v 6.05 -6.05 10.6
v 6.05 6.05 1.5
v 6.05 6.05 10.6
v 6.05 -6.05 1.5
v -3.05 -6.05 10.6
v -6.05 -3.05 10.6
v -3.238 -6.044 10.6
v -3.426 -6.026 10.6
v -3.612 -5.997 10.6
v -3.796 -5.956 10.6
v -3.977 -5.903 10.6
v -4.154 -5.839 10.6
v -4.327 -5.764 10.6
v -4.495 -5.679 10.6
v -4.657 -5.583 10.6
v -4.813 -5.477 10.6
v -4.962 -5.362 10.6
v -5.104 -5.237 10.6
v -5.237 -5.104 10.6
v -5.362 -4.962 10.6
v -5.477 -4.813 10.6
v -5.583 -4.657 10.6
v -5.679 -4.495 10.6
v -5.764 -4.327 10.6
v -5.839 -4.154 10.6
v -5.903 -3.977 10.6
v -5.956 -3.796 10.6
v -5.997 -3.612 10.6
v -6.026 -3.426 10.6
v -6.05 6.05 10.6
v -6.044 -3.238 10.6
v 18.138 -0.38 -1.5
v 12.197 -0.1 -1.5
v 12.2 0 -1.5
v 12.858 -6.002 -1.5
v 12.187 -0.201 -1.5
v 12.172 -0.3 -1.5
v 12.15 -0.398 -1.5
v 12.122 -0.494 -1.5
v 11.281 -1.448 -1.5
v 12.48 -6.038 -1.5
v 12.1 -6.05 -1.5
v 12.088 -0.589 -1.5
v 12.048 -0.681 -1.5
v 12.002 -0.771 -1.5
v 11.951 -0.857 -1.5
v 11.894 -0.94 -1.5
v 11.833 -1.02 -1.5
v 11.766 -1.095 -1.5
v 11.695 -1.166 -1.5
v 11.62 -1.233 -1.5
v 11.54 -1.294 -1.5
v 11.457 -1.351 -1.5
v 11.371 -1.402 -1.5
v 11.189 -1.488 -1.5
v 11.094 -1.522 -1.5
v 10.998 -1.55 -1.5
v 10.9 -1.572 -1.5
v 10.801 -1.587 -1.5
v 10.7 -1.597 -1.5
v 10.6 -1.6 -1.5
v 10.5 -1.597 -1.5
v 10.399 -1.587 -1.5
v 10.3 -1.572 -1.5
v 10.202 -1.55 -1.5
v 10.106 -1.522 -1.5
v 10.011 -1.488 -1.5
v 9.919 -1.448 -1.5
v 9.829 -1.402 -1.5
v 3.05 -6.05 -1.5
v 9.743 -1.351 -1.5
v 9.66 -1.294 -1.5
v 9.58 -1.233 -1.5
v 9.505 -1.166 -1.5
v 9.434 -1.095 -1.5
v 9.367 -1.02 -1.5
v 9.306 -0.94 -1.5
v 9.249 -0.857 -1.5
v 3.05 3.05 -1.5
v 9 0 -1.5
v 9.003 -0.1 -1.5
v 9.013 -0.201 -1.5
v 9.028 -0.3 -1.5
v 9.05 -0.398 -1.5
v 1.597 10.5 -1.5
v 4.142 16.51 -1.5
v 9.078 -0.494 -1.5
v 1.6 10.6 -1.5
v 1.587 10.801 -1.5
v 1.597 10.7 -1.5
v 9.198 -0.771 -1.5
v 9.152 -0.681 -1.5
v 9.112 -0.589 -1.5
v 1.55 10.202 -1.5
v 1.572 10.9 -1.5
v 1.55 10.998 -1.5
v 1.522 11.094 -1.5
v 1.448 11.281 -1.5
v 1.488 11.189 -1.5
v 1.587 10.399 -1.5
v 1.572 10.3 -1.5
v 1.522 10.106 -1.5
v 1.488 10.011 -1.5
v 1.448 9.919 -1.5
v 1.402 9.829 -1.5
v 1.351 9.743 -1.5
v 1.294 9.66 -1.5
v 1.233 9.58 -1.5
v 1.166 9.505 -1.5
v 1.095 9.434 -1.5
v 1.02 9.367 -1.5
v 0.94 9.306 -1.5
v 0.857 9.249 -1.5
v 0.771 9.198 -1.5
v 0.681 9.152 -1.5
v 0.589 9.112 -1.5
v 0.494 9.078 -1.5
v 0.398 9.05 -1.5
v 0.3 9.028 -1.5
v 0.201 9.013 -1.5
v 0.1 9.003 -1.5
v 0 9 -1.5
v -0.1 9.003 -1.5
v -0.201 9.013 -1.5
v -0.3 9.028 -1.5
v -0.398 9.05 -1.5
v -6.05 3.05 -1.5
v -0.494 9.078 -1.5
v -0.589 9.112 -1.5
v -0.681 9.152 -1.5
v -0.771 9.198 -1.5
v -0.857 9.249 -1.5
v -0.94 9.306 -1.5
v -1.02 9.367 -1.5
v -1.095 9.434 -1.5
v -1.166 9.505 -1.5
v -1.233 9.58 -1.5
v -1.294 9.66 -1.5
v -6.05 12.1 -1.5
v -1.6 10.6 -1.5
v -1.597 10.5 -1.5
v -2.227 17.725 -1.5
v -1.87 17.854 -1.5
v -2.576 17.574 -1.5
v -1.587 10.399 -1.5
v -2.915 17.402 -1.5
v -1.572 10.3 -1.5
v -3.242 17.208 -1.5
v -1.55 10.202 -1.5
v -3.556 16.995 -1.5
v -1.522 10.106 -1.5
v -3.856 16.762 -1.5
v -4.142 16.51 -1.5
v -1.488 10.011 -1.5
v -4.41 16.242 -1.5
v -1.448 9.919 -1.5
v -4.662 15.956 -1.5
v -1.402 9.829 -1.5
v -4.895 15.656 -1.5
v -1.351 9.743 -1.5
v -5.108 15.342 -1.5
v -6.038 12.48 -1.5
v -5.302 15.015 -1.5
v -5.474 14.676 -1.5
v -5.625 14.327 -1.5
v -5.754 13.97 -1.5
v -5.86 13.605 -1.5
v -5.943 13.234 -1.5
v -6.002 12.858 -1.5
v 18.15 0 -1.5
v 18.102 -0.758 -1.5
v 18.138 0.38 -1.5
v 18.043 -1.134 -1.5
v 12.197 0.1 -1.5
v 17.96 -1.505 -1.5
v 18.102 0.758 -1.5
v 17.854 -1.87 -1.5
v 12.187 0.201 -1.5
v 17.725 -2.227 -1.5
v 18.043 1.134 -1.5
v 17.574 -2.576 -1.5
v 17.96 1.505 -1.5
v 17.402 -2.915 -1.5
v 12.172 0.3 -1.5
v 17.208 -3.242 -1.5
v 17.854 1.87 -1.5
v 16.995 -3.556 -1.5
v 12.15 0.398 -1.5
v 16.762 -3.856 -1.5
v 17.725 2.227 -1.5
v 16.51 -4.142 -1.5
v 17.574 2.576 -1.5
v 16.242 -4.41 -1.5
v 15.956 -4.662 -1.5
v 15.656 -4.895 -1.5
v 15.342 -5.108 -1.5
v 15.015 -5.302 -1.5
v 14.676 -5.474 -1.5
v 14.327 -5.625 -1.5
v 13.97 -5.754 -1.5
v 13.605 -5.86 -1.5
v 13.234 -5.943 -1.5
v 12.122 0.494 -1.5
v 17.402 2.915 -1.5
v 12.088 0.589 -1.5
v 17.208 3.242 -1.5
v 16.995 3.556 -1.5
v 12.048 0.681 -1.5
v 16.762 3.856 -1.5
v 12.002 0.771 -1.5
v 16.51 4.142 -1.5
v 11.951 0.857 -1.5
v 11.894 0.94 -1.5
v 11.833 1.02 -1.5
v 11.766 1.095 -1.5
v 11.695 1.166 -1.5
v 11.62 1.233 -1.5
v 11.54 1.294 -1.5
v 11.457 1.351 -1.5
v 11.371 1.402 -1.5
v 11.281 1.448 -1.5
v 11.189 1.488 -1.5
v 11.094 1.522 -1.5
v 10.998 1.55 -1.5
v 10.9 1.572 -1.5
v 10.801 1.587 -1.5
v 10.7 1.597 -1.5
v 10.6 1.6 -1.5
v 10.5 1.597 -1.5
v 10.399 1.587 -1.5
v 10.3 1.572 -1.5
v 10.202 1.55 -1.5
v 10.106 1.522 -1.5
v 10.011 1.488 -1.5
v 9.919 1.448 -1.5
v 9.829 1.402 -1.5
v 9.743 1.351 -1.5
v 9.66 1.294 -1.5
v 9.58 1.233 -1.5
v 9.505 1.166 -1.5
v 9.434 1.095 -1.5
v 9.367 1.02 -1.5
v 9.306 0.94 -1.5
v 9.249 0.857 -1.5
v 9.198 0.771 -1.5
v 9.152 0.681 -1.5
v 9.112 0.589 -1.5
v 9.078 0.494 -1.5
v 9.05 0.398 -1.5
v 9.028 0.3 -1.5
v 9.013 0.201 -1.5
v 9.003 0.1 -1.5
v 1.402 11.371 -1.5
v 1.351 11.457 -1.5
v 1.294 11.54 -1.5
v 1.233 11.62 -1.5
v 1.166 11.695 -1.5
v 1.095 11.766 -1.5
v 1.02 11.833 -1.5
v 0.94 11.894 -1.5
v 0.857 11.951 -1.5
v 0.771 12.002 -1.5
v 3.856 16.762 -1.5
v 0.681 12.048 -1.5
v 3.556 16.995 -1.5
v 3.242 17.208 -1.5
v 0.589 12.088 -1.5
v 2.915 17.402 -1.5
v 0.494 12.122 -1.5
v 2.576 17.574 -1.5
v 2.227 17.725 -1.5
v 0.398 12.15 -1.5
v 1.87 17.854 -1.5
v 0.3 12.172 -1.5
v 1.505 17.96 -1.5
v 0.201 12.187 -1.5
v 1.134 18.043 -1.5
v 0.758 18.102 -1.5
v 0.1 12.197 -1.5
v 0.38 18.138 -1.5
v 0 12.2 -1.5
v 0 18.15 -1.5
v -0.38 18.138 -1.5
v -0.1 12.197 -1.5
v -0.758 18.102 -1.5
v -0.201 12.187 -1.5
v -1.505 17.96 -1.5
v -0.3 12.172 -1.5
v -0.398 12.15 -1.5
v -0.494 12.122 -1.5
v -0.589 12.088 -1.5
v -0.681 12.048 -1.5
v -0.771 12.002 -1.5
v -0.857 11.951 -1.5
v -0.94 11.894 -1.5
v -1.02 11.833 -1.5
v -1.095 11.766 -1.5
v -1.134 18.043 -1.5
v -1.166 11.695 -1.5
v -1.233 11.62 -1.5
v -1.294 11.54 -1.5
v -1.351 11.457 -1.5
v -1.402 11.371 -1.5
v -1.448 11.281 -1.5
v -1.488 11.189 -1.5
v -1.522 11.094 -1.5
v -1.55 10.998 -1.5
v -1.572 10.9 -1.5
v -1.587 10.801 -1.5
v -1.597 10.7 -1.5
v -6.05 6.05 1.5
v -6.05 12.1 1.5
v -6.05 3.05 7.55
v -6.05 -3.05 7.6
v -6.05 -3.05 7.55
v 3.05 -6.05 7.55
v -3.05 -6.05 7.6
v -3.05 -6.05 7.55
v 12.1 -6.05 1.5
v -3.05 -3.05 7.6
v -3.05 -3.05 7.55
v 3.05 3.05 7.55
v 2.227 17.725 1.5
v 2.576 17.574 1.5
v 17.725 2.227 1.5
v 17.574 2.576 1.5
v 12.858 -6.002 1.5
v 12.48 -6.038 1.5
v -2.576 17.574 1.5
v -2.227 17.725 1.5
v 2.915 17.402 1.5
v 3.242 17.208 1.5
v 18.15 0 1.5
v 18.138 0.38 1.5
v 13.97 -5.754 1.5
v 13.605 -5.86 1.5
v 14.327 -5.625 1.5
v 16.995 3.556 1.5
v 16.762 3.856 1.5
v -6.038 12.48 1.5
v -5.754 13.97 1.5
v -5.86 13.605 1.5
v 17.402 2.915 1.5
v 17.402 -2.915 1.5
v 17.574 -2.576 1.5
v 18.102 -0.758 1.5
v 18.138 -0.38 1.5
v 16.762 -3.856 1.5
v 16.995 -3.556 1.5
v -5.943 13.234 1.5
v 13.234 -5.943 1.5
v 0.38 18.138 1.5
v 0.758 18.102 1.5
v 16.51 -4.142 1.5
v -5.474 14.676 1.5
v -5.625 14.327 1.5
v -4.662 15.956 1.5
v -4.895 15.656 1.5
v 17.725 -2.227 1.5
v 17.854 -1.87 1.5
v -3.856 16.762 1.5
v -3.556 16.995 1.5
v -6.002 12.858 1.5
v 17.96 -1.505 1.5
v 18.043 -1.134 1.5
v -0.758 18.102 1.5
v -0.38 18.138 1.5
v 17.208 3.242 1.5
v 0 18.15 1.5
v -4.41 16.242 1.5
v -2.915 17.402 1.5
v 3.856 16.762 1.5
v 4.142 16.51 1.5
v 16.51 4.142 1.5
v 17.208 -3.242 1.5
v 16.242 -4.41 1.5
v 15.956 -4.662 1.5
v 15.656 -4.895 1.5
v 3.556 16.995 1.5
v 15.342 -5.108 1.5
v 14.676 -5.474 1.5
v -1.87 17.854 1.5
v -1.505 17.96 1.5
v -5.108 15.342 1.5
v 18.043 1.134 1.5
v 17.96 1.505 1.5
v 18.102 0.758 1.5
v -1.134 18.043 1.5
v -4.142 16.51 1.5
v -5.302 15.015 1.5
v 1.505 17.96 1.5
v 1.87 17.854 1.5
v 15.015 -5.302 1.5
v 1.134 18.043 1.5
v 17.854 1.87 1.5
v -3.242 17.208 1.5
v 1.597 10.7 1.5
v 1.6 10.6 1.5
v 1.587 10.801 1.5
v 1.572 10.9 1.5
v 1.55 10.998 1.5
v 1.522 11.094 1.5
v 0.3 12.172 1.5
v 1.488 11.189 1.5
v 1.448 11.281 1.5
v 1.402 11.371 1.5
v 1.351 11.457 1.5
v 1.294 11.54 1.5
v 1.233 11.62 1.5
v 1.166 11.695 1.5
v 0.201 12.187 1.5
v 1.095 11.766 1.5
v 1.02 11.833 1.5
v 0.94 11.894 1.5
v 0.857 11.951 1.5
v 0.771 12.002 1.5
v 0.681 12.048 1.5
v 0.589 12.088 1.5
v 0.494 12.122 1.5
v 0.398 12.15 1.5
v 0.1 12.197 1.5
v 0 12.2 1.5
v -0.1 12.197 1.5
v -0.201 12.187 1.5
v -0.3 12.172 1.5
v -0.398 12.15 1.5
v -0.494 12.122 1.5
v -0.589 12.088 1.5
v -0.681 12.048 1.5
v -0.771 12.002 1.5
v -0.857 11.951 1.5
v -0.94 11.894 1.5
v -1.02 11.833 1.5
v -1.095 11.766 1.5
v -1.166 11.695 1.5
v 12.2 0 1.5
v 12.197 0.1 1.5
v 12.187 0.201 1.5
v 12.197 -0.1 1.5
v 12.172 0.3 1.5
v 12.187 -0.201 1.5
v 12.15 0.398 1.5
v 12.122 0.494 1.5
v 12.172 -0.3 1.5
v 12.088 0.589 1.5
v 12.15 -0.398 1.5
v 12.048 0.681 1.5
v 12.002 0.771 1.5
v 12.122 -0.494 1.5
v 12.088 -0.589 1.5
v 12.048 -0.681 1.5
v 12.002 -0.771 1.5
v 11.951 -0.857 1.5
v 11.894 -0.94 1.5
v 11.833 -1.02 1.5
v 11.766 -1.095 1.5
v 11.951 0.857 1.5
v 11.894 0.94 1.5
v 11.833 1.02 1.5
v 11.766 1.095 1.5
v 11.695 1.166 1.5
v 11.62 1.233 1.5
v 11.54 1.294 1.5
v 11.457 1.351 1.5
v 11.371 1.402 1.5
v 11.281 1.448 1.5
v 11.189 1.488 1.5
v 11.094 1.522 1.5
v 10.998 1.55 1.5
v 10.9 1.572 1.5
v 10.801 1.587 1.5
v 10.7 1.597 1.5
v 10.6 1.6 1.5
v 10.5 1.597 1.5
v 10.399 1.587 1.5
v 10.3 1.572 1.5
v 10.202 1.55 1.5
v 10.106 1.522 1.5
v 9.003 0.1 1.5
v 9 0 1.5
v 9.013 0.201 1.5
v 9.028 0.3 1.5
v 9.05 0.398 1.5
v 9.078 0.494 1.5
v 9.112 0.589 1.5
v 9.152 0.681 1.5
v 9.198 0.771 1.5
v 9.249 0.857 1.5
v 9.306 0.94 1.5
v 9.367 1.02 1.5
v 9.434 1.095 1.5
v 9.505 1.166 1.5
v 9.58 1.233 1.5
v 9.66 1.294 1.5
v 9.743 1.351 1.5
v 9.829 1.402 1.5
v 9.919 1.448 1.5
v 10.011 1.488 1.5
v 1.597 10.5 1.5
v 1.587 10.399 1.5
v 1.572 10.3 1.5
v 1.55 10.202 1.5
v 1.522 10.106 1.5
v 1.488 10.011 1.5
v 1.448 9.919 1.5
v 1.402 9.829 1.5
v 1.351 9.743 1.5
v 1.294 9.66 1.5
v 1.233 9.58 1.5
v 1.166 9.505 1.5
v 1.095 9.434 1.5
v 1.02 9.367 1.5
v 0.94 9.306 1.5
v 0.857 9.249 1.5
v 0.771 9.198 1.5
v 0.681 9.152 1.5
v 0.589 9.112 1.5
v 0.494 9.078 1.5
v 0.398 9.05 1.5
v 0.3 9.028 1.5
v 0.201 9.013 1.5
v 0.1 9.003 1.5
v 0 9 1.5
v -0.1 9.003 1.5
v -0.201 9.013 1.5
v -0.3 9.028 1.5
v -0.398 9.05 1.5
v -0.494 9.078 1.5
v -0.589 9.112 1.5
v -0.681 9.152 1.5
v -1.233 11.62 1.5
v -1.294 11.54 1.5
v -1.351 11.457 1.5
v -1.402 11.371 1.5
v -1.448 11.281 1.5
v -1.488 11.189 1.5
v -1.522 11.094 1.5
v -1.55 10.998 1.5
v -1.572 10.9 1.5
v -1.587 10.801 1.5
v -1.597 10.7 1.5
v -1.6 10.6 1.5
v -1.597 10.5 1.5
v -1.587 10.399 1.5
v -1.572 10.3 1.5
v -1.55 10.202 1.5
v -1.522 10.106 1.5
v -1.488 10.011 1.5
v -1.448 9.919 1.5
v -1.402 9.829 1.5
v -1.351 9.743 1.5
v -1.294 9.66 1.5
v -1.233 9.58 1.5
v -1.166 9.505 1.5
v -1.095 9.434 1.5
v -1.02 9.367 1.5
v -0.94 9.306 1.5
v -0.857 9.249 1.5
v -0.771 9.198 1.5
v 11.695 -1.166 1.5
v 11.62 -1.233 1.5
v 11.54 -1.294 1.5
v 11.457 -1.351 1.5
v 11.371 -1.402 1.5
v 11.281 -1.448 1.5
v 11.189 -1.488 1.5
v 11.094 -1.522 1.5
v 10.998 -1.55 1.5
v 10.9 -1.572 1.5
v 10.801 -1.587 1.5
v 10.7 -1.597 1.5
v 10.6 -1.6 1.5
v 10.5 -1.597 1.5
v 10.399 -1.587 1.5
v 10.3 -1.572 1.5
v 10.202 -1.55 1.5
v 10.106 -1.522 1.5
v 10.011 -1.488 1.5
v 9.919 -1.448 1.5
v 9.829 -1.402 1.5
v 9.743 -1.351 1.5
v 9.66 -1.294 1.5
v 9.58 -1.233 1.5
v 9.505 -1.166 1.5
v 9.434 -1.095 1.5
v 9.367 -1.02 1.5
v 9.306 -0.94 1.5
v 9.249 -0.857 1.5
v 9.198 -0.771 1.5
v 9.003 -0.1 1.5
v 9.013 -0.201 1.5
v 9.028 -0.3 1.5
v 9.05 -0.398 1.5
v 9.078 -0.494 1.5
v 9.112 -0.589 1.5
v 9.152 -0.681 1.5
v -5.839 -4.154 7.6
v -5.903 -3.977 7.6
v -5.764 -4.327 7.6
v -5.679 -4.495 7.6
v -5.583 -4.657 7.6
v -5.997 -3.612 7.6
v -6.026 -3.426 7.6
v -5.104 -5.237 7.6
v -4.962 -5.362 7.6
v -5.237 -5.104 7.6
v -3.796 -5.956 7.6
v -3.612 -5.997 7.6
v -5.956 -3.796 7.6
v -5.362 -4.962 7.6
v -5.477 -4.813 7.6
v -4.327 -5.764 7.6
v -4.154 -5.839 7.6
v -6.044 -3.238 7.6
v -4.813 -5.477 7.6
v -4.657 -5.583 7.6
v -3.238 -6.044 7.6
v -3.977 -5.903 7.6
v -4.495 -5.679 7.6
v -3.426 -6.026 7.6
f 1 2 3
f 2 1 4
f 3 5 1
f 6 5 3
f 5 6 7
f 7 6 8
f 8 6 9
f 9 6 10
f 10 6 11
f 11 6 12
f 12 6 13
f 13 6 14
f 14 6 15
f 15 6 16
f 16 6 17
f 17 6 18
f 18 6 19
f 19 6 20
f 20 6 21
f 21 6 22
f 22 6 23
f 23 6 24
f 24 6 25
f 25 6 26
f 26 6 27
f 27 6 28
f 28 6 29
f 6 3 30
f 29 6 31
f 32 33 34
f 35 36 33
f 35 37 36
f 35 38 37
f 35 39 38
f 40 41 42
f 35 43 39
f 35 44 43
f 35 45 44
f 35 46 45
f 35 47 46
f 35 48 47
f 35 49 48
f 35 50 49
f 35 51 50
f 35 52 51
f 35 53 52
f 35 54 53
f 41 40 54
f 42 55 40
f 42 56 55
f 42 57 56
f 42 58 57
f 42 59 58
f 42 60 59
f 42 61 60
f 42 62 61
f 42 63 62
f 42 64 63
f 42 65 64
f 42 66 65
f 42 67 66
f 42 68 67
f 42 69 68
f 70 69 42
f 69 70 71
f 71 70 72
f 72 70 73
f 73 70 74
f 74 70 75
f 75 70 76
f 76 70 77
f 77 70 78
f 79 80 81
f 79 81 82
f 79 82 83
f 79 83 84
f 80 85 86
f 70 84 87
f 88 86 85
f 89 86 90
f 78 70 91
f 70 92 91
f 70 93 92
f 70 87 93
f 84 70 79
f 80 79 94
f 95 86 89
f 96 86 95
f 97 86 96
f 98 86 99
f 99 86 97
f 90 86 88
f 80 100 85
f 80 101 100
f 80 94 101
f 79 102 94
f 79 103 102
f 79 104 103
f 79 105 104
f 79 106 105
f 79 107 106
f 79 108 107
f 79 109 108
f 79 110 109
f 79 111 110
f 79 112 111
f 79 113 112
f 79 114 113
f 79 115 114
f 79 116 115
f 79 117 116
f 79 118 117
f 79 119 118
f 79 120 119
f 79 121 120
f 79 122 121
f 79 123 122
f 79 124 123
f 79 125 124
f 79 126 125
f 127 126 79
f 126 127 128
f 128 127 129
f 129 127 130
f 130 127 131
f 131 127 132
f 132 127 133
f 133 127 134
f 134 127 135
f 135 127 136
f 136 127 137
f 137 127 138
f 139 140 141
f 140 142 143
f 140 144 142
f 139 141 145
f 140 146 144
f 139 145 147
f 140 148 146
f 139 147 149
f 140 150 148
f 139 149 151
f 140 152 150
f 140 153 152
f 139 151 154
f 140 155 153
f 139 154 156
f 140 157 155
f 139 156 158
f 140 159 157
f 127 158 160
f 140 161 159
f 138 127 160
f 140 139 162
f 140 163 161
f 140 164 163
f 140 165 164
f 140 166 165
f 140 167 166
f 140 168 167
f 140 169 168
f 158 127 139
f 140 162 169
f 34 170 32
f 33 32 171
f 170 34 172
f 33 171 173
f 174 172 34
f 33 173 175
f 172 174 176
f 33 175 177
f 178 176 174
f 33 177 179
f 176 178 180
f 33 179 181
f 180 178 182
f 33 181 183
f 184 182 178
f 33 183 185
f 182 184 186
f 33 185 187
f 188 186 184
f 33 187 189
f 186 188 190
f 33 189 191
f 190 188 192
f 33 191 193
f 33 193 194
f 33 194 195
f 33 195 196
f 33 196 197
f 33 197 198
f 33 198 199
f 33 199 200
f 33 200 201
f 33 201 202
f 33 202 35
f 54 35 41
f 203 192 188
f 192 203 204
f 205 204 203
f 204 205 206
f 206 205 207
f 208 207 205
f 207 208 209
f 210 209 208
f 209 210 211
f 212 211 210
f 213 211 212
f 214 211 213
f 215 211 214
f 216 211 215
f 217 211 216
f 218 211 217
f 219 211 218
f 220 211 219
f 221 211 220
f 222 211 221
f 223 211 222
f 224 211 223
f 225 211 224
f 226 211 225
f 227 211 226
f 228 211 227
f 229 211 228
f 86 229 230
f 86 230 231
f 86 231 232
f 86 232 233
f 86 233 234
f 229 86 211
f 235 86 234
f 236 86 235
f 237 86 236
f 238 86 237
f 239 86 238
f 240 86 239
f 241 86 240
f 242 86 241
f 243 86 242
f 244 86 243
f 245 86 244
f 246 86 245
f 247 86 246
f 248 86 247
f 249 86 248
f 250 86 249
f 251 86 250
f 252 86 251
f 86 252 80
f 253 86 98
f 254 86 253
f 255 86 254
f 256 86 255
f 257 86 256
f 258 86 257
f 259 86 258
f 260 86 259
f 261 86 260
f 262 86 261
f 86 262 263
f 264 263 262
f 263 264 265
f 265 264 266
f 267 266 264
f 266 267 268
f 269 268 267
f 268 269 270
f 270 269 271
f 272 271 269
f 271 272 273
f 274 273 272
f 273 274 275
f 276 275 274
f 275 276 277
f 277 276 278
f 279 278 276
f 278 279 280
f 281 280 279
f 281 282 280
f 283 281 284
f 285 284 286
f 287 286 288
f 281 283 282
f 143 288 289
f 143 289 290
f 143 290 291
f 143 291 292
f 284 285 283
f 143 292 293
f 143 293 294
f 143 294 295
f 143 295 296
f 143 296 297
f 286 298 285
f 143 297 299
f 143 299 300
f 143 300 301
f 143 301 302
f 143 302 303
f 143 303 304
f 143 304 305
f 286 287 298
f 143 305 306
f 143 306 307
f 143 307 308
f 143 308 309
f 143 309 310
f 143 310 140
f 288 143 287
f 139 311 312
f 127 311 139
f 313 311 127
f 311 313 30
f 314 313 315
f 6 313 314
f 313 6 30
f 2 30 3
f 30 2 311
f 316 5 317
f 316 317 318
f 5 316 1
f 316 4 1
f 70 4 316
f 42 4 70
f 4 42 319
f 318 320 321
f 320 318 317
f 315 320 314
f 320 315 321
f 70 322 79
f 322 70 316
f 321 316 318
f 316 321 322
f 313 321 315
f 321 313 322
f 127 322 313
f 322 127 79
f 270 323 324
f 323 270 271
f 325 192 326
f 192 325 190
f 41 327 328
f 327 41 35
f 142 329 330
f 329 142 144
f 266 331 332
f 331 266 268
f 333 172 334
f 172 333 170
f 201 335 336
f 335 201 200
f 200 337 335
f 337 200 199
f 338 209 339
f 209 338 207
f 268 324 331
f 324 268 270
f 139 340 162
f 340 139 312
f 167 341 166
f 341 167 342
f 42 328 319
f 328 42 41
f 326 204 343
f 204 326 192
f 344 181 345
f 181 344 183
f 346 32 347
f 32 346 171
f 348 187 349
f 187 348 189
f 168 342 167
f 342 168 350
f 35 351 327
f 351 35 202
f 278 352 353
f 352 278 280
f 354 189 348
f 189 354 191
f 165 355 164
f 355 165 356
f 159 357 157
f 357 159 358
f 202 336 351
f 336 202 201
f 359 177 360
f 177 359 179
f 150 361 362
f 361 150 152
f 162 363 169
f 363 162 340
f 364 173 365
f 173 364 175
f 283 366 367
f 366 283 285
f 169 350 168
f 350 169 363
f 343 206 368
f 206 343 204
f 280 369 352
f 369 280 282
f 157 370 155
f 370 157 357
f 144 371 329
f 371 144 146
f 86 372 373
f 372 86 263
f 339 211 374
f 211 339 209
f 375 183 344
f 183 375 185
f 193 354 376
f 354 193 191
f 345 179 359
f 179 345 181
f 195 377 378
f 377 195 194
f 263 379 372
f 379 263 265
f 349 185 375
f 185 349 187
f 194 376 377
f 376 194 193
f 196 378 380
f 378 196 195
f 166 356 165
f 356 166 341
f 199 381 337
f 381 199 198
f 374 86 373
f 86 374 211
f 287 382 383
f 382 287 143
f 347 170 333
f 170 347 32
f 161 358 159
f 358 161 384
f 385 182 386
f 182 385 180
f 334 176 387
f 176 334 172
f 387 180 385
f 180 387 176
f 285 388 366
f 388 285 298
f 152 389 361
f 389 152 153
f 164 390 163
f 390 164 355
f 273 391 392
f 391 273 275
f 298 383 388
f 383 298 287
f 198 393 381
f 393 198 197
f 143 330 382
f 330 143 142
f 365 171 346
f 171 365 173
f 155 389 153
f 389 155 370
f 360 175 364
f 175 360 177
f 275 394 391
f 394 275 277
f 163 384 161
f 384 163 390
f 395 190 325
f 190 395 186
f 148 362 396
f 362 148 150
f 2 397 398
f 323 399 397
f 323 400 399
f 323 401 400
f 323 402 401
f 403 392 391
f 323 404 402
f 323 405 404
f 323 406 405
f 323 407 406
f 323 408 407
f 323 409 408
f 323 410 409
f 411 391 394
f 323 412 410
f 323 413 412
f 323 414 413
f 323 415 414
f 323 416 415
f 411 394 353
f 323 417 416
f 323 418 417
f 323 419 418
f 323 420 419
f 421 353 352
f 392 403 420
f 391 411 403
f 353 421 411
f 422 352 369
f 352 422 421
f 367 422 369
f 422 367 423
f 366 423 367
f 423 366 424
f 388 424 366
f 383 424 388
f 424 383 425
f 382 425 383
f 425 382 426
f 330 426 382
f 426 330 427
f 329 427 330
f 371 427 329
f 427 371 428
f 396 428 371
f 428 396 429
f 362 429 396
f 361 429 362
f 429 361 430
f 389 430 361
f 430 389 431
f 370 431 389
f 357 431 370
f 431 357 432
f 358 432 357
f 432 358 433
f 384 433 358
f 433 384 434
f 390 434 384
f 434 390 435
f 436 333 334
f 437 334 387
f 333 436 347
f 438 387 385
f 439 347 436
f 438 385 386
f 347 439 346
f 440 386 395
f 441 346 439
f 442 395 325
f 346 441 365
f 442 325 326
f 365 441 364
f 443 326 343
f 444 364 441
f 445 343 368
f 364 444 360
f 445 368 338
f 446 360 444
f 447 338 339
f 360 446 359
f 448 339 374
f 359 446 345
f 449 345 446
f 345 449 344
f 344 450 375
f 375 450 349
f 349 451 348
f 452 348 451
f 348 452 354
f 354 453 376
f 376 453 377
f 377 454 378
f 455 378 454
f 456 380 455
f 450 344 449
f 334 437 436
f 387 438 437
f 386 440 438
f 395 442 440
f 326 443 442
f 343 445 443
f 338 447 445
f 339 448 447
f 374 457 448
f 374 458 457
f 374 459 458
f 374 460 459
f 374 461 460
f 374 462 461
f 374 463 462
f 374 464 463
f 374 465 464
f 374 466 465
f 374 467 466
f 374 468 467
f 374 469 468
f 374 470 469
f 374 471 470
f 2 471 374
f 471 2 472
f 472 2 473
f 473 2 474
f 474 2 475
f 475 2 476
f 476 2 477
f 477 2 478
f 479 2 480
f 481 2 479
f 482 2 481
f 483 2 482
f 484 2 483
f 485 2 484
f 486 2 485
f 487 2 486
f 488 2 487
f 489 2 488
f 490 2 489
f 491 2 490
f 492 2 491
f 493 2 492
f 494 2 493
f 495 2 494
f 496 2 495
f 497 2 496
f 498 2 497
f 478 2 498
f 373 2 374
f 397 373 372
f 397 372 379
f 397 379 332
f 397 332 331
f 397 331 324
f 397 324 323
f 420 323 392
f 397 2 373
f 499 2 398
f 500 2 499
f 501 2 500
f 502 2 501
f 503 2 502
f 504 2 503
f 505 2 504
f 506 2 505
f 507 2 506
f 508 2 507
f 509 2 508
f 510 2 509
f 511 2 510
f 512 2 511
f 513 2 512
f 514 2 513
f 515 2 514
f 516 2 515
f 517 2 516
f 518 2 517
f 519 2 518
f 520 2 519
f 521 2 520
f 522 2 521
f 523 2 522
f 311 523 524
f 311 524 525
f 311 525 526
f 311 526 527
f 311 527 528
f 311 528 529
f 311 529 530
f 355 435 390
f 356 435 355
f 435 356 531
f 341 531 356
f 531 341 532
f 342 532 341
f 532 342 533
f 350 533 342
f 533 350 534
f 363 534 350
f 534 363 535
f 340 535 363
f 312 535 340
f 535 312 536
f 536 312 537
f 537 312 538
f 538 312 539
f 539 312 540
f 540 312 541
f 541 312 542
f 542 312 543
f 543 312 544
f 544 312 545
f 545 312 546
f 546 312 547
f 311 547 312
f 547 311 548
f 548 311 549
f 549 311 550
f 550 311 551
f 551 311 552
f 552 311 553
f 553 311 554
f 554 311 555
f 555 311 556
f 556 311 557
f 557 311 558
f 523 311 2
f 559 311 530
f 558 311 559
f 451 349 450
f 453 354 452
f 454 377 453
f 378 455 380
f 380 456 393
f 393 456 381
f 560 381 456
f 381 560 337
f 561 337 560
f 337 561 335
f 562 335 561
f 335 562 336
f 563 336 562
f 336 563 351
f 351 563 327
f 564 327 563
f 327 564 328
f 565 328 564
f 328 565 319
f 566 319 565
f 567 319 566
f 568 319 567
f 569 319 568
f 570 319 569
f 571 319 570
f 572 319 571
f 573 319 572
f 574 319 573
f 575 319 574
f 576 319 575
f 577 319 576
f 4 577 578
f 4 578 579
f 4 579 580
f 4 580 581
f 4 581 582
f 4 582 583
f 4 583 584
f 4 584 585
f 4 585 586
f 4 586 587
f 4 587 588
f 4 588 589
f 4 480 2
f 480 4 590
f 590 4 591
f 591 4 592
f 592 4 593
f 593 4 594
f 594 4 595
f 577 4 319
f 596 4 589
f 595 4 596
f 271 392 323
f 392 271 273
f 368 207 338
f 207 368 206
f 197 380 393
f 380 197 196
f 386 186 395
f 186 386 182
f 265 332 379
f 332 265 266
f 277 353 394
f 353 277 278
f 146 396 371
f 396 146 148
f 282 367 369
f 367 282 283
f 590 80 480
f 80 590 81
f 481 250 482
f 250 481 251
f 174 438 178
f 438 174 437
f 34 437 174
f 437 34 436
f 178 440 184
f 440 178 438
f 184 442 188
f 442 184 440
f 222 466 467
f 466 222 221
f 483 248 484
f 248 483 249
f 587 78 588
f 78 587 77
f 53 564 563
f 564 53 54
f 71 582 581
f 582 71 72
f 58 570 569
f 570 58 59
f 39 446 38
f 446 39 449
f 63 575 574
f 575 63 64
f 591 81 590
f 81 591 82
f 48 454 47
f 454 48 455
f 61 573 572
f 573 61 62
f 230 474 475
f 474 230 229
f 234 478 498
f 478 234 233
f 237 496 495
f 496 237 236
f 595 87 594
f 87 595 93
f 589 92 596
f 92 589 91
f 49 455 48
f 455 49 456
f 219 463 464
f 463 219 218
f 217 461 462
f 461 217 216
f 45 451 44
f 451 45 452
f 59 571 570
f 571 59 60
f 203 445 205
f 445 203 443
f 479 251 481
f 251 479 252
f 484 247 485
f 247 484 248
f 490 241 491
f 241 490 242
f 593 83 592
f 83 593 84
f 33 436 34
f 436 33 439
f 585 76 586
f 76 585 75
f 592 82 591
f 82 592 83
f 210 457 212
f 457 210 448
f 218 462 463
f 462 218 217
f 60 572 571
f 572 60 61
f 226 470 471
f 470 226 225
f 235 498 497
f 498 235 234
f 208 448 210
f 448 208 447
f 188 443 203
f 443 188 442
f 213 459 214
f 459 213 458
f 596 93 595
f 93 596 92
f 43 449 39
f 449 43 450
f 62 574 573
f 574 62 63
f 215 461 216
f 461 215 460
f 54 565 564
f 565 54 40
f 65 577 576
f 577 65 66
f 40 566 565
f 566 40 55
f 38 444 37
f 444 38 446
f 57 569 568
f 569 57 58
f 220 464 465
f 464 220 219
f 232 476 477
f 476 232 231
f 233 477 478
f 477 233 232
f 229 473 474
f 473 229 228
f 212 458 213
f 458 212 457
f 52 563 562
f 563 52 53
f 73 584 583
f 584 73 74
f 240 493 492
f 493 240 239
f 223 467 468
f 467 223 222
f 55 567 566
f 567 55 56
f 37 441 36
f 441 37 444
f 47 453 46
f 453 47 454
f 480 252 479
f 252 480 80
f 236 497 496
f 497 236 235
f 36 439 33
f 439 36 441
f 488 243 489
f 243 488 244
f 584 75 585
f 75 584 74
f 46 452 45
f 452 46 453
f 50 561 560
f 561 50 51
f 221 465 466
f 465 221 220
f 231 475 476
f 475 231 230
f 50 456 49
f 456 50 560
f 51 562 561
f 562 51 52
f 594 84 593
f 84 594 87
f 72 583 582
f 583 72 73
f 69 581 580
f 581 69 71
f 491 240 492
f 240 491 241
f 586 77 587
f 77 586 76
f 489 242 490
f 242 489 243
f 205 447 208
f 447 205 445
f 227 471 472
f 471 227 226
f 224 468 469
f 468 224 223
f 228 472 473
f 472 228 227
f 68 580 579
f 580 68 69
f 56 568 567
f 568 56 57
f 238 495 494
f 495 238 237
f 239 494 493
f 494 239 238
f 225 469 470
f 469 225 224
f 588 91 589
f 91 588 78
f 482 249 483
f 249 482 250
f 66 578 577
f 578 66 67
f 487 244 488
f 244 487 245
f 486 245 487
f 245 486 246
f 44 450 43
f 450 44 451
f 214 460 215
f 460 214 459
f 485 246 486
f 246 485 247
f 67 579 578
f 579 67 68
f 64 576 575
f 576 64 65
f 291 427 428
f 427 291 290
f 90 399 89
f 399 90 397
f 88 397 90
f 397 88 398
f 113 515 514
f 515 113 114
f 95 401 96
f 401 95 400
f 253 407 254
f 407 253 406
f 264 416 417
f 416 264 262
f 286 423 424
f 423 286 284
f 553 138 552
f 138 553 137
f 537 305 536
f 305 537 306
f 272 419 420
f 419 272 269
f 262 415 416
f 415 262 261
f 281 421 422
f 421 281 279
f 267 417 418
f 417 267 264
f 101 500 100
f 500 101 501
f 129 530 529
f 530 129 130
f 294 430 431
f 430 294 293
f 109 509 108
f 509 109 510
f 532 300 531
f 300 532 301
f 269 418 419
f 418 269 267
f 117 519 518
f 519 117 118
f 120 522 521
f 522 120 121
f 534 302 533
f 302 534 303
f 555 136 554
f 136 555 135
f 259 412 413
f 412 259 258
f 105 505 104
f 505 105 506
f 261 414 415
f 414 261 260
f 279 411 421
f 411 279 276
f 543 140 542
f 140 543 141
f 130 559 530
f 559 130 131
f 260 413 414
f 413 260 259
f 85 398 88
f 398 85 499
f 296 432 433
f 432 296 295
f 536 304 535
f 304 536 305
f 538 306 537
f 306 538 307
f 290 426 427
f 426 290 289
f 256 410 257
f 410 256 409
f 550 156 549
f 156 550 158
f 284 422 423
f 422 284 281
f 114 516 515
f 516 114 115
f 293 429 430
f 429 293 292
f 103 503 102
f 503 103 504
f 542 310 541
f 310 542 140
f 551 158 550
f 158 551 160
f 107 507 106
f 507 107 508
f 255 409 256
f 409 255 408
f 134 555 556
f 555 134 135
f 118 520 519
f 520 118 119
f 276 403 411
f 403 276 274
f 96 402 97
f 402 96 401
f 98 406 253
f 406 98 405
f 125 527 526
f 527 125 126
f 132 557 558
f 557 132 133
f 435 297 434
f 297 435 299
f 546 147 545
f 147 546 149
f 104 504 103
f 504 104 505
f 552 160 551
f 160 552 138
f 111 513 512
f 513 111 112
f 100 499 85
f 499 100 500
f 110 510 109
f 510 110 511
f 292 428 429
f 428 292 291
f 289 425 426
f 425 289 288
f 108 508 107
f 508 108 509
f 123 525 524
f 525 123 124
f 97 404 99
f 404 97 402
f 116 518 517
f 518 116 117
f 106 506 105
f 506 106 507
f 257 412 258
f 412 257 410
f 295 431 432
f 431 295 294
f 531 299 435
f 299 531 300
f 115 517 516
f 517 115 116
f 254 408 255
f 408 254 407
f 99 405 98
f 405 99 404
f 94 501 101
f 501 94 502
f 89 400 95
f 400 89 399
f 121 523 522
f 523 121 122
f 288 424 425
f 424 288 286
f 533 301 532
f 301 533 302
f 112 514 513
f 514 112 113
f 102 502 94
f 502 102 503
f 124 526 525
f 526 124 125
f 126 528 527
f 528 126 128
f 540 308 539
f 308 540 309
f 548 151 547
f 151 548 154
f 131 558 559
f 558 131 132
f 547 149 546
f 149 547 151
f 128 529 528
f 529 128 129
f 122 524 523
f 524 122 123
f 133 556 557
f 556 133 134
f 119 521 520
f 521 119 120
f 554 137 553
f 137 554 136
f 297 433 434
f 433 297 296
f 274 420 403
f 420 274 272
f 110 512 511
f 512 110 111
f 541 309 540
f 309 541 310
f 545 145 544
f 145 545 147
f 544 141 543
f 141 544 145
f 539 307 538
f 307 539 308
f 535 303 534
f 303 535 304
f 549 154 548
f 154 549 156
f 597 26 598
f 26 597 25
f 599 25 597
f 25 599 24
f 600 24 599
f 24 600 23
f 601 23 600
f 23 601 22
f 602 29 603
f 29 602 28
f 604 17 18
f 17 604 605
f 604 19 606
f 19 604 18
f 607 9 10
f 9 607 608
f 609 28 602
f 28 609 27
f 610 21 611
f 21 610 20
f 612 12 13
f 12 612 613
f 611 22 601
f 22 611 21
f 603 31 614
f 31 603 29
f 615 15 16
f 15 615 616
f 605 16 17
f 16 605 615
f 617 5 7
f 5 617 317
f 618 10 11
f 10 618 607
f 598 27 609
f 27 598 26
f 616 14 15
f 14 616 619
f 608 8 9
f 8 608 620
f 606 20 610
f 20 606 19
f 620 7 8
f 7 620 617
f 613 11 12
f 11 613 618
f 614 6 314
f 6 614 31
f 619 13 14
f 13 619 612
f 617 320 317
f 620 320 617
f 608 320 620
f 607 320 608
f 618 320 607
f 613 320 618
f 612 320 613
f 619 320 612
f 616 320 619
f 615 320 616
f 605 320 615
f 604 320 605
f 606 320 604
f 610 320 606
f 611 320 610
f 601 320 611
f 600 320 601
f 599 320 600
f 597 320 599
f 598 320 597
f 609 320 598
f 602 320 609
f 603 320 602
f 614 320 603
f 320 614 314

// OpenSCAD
//Messurements

//Breadboard height
bbh = 9.1;

//Thickness of holder
wall = 3;

//Margin of error for screw
marg = 0.2;

//Faces of circles
faces = 100;


// Round corners and main cube
difference(){    
    
    //Make main cube
    difference(){ 
        translate([0, 0, (bbh+wall)/2-(wall/2)]){
            cube(bbh+wall, center=true);
        }
        // Corner cut out (For rounded corner)
        translate([-bbh/2, -bbh/2, bbh/2])
            cube([wall,wall,wall*10], center=true); 
    }
    
    //Cuts out where breadboard should be
    translate([-wall/2,-wall/2, wall]) cube(bbh, center=true);
}

// Circle for rounded corner
translate([-bbh/2+wall/2, -bbh/2+wall/2, bbh])
        cylinder(wall, r=wall, center=true, $fn=faces);

//Surround circles.
difference() {
    hull() {
        
        //Shape used for hulling
        cube([bbh+wall, bbh+wall, wall], center=true);
        
        //Circle 1
        translate([bbh+wall, 0, 0]) 
            cylinder(wall, d=bbh+wall, center=true,$fn=faces);
        
        //Circle 2
        translate([0, bbh+wall, 0]) 
            cylinder(wall, d=bbh+wall, center=true,$fn=faces);
    }

 

    //Cuts out where breadboard should be because otherwise big plate in bottom
    translate([-wall/2,-wall/2,-wall/2]) cube(bbh, center=true);
    
    //Make screw holes
    translate([bbh+wall/2,0,0]) cylinder(20, d=3+marg, center=true, $fn=faces);
    translate([0,bbh+wall/2,0]) cylinder(20, d=3+marg, center=true, $fn=faces);
}
